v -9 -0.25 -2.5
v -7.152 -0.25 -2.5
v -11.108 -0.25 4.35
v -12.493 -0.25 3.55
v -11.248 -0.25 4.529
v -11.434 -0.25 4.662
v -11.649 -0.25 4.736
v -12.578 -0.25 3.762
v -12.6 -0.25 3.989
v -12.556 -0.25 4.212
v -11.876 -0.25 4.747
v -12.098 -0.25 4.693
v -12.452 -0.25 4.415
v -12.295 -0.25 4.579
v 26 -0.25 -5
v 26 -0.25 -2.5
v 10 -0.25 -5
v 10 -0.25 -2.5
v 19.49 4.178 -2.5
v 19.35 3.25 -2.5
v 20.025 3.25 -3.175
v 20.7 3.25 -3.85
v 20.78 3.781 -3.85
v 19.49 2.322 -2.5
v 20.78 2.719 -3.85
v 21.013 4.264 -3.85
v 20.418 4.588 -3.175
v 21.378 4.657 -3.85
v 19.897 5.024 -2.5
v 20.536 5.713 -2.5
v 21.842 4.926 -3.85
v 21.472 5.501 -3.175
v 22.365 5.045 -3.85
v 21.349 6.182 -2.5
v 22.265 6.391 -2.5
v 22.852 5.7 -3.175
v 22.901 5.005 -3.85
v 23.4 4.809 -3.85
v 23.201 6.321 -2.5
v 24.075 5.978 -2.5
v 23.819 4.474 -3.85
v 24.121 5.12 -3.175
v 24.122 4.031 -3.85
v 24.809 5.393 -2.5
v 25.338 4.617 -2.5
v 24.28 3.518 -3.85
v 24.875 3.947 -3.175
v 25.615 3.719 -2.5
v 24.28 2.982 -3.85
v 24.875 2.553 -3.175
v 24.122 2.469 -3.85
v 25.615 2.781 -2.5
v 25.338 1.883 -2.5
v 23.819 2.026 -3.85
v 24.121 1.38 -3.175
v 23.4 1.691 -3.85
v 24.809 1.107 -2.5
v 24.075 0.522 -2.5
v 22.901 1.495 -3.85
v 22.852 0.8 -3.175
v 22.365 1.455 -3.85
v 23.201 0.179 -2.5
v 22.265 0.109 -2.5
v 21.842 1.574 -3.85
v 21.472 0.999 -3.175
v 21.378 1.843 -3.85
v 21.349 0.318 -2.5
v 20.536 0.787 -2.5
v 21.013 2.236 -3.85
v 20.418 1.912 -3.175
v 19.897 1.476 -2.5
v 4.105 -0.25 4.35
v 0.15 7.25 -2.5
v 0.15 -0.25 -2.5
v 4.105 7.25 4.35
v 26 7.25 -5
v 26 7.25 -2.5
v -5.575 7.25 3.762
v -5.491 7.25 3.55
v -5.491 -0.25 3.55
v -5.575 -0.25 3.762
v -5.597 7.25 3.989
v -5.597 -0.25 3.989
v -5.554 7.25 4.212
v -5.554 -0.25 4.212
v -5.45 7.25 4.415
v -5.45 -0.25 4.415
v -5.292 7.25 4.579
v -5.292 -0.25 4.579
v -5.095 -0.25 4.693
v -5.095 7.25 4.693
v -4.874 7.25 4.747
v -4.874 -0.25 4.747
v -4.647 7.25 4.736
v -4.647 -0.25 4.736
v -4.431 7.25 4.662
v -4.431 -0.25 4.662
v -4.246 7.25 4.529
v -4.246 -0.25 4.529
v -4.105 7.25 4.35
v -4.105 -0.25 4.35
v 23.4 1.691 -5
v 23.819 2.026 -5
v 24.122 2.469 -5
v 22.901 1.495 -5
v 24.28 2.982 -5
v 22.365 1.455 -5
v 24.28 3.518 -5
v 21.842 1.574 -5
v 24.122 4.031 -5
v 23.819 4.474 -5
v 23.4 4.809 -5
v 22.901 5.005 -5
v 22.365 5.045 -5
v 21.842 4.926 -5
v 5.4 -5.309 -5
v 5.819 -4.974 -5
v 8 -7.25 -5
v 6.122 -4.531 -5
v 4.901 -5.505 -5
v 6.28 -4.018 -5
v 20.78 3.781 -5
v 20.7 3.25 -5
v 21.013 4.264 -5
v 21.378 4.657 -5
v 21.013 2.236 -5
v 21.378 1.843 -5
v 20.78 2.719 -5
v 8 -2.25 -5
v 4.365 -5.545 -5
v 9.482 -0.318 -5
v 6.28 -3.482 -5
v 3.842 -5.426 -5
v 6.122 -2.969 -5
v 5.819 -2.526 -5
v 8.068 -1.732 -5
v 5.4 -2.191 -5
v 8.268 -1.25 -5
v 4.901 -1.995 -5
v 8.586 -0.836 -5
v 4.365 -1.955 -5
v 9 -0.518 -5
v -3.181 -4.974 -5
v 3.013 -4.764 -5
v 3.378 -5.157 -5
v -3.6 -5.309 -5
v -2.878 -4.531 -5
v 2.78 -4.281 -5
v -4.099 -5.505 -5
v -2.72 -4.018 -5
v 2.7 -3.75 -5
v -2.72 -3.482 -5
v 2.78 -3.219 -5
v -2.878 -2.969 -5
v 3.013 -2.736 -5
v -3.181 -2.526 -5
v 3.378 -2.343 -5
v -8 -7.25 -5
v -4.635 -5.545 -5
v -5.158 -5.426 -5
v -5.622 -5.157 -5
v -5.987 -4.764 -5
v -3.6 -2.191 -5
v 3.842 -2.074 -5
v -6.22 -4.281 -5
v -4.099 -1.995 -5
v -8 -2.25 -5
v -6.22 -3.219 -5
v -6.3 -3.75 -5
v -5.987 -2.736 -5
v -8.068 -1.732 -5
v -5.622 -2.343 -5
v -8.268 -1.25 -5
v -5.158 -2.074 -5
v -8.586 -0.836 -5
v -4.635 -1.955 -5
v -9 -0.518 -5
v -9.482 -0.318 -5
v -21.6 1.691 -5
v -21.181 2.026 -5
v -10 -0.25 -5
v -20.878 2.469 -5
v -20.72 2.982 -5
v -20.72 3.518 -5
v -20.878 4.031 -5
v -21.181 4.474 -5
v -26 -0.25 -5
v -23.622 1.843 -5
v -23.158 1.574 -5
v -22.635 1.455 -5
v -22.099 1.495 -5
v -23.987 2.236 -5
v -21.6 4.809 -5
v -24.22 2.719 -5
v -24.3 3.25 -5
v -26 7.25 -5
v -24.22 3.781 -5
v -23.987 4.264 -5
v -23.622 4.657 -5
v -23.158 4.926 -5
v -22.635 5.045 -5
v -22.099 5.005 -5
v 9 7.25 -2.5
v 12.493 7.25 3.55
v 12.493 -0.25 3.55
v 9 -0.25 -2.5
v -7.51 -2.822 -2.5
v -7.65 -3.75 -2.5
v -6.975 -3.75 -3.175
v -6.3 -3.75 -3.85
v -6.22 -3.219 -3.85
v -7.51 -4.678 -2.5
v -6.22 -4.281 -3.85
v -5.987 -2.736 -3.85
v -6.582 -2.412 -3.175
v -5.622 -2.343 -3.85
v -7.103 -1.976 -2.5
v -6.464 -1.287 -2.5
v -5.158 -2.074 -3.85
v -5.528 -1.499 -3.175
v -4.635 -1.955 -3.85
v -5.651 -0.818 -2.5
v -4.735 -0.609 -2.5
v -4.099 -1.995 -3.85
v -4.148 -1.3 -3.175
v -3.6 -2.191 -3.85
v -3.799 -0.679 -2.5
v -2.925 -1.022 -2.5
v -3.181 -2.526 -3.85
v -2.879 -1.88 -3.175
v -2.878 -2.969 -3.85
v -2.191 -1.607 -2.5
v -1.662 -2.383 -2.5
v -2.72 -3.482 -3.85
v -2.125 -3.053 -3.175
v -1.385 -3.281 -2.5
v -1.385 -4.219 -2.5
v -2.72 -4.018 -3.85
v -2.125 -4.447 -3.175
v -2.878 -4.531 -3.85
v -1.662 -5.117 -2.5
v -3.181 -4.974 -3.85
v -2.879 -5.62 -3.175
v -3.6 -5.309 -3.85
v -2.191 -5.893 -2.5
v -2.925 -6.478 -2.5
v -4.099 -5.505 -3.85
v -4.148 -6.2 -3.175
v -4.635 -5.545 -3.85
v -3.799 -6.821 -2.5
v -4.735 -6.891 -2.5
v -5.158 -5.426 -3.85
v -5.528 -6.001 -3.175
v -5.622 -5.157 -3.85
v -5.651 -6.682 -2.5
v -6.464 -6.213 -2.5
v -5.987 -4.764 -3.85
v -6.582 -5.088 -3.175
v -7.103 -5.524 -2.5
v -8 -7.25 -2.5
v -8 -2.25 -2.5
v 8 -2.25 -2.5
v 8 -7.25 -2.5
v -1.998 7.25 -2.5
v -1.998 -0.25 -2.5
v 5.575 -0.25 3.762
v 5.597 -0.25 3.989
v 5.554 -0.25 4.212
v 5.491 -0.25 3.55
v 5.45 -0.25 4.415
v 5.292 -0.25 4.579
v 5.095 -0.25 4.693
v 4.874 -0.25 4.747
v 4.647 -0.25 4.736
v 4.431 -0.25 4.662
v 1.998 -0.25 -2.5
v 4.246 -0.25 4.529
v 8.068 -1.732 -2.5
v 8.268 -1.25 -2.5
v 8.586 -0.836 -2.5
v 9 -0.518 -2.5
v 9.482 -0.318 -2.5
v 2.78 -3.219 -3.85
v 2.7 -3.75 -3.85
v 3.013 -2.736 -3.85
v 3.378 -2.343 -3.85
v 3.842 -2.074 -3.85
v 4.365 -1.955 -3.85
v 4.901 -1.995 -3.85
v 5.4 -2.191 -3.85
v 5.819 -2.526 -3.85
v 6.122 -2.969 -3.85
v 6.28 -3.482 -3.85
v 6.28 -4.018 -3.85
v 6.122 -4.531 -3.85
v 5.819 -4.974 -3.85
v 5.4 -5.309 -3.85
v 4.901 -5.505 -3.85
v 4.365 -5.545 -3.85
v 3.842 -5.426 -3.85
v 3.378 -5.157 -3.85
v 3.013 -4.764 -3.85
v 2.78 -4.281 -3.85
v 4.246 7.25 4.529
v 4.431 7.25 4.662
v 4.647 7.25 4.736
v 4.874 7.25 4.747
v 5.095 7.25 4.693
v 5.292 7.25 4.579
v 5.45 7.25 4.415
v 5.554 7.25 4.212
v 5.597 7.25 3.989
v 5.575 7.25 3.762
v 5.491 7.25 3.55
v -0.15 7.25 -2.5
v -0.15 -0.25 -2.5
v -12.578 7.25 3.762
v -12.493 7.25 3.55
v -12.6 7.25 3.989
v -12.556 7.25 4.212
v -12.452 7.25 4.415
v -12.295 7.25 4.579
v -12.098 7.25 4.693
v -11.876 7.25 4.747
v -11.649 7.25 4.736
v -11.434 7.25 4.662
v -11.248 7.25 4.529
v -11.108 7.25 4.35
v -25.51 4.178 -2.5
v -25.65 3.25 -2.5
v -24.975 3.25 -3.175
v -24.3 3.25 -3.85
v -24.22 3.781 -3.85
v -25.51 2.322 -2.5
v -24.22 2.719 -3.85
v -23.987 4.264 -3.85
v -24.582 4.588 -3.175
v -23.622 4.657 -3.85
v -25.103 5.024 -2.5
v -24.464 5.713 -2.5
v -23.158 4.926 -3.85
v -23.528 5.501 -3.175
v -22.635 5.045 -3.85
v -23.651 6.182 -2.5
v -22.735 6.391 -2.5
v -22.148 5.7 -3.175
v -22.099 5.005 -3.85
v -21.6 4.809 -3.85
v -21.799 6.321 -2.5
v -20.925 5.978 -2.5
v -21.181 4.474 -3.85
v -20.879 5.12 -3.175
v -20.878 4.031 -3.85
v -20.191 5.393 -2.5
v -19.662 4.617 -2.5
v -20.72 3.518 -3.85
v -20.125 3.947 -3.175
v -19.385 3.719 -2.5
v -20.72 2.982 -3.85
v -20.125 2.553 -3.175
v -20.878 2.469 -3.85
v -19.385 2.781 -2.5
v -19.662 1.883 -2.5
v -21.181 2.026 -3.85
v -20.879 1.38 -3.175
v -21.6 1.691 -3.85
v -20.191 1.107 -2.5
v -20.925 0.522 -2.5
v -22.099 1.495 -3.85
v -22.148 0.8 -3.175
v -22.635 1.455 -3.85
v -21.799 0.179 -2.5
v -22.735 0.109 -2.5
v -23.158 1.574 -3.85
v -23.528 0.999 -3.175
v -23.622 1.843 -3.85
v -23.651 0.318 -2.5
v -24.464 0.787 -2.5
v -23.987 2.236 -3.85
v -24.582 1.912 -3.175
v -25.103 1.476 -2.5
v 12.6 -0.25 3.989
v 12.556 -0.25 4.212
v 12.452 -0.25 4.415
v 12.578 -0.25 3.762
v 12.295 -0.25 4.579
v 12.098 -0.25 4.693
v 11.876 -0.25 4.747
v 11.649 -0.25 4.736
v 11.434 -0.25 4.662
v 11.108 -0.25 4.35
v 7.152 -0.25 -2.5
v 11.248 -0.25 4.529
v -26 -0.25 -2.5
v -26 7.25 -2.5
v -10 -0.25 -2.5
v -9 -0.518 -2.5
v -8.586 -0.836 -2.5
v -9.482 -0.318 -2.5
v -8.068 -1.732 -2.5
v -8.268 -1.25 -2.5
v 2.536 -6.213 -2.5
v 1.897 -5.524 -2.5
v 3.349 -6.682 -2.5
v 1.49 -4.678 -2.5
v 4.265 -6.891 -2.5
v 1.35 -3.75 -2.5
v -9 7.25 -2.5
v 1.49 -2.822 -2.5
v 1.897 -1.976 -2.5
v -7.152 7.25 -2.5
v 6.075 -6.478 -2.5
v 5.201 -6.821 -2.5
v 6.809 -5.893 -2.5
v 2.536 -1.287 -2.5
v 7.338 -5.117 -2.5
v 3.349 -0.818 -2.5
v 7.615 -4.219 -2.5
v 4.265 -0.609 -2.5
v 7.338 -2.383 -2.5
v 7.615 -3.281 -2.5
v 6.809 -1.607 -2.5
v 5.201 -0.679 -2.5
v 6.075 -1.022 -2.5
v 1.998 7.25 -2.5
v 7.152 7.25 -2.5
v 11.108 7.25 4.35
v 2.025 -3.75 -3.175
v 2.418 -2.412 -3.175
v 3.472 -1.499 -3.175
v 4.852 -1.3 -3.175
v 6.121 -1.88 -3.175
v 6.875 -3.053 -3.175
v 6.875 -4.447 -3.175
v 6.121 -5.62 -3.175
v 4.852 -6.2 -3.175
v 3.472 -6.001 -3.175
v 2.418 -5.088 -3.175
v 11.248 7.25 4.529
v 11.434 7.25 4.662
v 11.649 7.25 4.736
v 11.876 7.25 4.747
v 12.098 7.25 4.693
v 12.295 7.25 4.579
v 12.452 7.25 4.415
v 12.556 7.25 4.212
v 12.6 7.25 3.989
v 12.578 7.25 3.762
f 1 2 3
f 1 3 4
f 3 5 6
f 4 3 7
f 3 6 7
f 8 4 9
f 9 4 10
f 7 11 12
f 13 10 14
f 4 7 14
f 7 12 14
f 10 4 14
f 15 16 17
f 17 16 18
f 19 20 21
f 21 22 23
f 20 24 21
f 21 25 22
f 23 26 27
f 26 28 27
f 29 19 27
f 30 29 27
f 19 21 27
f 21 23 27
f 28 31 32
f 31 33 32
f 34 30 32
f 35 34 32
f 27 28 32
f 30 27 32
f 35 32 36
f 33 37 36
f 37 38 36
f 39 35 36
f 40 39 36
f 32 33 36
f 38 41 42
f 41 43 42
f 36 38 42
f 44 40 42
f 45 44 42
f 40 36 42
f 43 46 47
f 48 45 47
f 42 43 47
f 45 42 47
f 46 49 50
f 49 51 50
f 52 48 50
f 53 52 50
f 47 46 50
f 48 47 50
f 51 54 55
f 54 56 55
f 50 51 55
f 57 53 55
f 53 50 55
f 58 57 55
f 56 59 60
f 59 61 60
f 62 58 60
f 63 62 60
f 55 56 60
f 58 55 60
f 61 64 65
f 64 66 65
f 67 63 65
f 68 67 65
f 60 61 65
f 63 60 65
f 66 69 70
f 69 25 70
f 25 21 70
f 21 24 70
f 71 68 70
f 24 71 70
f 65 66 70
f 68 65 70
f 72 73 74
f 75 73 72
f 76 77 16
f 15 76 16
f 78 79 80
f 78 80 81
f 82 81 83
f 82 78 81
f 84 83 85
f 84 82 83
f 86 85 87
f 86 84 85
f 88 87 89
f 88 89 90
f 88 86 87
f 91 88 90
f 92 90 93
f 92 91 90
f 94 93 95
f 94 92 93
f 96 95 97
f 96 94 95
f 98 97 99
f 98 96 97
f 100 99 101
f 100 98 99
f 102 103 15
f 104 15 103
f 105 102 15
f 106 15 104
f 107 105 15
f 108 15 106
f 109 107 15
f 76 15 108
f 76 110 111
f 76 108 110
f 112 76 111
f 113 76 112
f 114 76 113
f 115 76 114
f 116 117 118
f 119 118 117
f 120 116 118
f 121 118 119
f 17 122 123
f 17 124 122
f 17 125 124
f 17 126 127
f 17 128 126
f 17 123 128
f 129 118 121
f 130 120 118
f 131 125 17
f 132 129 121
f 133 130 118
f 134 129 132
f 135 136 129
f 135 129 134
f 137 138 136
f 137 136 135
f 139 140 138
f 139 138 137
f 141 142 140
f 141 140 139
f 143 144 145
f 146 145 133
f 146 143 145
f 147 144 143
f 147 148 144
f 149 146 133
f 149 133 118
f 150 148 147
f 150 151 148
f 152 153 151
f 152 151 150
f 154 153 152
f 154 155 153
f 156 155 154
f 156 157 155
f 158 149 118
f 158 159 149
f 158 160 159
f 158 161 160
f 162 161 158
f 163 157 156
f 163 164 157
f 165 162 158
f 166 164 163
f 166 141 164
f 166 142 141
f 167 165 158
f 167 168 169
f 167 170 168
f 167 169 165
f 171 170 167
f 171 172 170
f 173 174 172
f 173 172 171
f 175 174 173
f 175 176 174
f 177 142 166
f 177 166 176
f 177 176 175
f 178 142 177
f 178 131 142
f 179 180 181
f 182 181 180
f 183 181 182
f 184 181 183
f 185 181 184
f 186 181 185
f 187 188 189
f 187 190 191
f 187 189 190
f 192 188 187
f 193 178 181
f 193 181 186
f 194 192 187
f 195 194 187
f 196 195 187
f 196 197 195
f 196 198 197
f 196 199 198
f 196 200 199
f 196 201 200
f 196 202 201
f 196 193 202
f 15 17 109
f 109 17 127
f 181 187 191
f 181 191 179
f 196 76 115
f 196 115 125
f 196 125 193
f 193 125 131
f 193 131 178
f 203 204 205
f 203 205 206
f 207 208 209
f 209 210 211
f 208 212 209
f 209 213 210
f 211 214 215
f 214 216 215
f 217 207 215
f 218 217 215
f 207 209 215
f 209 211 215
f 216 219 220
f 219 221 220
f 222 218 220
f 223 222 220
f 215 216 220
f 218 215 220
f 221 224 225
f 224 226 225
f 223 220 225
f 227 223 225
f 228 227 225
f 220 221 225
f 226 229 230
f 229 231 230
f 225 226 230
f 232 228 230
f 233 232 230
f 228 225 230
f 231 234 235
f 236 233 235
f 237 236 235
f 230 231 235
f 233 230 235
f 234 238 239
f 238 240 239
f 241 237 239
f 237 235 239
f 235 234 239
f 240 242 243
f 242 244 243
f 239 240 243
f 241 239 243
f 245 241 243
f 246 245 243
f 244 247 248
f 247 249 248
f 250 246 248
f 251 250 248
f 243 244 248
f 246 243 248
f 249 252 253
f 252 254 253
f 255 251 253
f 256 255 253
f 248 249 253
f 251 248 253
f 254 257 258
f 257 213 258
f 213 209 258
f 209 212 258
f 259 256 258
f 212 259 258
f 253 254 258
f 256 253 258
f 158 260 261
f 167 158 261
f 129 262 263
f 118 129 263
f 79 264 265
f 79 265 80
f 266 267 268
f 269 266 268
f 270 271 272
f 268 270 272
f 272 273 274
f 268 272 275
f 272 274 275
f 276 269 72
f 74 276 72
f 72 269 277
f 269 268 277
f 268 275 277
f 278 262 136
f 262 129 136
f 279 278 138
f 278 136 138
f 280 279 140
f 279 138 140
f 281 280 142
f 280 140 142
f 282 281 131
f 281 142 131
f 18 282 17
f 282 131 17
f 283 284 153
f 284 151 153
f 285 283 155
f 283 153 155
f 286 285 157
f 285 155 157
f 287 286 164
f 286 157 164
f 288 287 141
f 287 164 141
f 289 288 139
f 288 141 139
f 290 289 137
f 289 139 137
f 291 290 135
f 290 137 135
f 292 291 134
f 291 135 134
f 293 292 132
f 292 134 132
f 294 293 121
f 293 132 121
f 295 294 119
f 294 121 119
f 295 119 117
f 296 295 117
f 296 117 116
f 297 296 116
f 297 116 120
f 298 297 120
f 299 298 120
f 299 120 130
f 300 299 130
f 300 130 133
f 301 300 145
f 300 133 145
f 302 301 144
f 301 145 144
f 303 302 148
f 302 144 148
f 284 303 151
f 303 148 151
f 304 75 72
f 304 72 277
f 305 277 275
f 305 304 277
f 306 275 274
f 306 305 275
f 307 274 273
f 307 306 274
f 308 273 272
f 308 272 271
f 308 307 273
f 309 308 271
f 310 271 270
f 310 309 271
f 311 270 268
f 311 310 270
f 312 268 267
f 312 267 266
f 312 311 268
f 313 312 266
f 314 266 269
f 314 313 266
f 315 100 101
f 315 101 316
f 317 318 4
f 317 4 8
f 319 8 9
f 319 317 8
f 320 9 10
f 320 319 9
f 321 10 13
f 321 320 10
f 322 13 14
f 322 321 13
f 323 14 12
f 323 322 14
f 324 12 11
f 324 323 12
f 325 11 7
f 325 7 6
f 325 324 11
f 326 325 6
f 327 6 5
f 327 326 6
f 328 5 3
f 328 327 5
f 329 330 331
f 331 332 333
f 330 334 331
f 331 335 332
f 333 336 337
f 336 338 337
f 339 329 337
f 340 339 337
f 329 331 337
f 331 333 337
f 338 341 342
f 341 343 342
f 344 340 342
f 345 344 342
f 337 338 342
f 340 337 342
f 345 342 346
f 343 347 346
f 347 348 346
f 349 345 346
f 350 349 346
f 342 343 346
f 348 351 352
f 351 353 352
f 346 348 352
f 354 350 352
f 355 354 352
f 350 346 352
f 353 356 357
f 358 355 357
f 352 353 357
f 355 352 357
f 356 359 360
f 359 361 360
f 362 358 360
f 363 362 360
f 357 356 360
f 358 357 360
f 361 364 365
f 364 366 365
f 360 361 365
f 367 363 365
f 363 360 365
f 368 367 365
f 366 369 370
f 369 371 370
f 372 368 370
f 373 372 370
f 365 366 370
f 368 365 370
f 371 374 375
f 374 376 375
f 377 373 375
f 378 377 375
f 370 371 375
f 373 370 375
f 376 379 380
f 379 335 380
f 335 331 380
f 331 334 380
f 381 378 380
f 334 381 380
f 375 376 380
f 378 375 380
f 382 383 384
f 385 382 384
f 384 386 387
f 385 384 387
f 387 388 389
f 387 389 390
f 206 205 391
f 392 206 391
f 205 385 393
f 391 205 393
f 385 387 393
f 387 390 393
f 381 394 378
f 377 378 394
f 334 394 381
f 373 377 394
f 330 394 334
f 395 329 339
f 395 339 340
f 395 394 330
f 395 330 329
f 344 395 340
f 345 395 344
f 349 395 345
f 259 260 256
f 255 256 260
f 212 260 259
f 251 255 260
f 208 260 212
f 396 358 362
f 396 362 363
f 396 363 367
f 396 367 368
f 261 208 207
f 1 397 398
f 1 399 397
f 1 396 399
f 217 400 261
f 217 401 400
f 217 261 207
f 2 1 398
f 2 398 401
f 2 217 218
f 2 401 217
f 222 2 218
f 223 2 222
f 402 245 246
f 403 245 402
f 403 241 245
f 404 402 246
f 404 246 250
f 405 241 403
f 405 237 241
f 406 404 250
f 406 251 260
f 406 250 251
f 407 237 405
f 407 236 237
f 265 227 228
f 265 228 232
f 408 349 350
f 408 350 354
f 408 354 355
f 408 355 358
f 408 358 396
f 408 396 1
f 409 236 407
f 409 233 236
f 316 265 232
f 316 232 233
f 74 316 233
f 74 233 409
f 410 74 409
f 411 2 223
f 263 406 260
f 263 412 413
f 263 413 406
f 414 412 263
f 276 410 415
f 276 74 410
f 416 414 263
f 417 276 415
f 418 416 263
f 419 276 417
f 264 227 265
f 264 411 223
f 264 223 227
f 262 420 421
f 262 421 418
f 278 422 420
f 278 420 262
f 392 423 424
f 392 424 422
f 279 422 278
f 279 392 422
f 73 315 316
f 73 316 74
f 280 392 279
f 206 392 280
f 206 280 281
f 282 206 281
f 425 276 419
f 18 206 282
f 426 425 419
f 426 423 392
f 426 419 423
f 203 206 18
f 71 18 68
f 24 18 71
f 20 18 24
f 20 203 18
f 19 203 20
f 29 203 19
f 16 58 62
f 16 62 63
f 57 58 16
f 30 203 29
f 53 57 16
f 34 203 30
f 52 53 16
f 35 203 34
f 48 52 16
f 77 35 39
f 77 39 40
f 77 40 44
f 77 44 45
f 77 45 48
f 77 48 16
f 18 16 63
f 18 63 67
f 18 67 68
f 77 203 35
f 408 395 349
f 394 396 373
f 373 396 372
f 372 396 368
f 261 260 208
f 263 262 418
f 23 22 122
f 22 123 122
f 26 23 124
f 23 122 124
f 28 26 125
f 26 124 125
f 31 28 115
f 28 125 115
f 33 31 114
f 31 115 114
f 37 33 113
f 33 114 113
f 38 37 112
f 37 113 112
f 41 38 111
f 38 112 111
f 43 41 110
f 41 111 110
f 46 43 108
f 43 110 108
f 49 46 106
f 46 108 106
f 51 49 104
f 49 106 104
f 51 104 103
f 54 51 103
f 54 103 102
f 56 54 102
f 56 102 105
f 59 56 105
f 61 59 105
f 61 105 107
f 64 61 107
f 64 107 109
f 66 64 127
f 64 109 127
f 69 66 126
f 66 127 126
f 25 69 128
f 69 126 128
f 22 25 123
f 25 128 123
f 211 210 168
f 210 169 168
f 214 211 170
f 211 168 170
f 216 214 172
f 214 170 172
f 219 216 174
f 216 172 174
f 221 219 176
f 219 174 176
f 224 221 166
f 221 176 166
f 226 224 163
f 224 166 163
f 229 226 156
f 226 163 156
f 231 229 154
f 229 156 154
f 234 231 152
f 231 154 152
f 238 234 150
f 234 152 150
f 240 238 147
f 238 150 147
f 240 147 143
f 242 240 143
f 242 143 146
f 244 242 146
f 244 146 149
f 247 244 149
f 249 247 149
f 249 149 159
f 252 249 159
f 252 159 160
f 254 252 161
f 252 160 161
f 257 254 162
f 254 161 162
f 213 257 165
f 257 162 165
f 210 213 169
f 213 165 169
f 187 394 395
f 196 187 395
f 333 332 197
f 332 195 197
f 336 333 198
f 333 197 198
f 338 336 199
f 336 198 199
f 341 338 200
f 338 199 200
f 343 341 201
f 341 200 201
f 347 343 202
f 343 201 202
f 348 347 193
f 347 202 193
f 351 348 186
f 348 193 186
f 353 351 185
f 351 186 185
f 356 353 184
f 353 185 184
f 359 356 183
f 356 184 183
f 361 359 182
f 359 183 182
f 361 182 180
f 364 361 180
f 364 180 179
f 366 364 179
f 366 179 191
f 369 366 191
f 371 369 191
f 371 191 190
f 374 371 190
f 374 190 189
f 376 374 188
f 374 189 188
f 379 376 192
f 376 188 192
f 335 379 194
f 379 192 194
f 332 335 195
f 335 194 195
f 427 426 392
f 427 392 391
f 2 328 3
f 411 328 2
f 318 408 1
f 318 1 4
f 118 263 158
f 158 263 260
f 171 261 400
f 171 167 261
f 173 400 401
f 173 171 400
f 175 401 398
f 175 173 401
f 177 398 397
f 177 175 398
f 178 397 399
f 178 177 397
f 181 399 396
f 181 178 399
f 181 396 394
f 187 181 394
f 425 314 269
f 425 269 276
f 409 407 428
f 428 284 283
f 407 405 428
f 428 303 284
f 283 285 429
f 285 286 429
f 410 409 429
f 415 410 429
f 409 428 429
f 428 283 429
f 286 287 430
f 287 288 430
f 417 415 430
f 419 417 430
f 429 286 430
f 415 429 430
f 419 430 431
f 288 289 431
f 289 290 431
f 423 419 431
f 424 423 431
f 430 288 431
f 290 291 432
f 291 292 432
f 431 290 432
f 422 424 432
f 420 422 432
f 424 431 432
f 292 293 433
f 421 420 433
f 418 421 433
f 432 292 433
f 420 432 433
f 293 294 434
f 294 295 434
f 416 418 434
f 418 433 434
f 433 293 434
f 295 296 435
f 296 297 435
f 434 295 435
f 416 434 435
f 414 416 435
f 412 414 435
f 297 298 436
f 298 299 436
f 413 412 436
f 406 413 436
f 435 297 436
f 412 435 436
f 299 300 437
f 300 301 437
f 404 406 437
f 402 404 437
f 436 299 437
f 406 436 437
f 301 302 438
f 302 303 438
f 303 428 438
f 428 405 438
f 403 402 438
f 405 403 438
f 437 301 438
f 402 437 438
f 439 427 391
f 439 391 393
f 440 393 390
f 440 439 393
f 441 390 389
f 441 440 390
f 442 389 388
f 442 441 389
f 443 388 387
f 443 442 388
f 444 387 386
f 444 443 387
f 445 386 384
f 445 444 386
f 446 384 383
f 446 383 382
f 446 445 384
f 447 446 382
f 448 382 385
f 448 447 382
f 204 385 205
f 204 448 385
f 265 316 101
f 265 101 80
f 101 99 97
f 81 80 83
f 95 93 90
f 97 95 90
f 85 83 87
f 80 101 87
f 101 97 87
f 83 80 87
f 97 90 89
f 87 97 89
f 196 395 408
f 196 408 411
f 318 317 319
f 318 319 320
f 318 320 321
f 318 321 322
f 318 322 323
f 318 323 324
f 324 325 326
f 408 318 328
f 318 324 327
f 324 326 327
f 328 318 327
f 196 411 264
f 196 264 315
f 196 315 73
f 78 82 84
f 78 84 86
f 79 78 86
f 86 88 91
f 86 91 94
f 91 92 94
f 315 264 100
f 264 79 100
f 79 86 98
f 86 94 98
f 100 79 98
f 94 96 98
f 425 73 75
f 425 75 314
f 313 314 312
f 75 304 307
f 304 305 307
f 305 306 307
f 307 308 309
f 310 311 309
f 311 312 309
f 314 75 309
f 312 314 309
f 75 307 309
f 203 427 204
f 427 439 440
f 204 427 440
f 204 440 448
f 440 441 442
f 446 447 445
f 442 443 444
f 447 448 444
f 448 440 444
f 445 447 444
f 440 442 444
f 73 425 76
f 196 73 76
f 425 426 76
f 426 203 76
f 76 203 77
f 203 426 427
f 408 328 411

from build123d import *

# Parameters (mm, degrees)
BOSS_EXTRUDE1_DEPTH                                 = 5
SKETCH2_W                                           = 16
SKETCH2_H                                           = 7
SKETCH2_W_2                                         = 7
SKETCH2_H_2                                         = 7.5
CUT_EXTRUDE1_DEPTH                                  = 7.5
CSK_FOR_M3_COUNTERSUNK_FLAT_HEAD_SCREW1_D           = 3.6
CSK_FOR_M3_COUNTERSUNK_FLAT_HEAD_SCREW1_DEPTH       = 5
CSK_FOR_M3_COUNTERSUNK_FLAT_HEAD_SCREW1_CSINK_D     = 6.3
CSK_FOR_M3_COUNTERSUNK_FLAT_HEAD_SCREW1_CSINK_ANGLE = 90
CSK_FOR_M3_COUNTERSUNK_FLAT_HEAD_SCREW1_TIP         = 1.081549114
FILLET1_R                                           = 2
CUT_EXTRUDE2_DEPTH                                  = 7.5


with BuildPart() as part:
    # Sketch1 → Boss-Extrude1 (new, symmetric)
    with BuildSketch(Plane.XY):
        Polygon((26, 7.25), (26, -0.25), (8, -0.25), (8, -7.25), (-8, -7.25), (-8, -0.25), (-26, -0.25), (-26, 7.25), align=None)
    extrude(amount=BOSS_EXTRUDE1_DEPTH, both=True)

    # Sketch2 → Cut-Extrude1 (cut)
    with BuildSketch(Plane.XY.offset(5)):
        with Locations((0, -3.75)):
            Rectangle(SKETCH2_W, SKETCH2_H)
        with Locations((22.5, 3.5)):
            Rectangle(SKETCH2_W_2, SKETCH2_H_2)
        with Locations((-22.5, 3.5)):
            Rectangle(SKETCH2_W_2, SKETCH2_H_2)
    extrude(amount=-CUT_EXTRUDE1_DEPTH, mode=Mode.SUBTRACT)

    # CSK for M3 Countersunk Flat Head Screw1
    with Locations(Plane.XY.offset(-2.5)):
        with Locations((-4.5, -3.75), (4.5, -3.75), (-22.5, 3.25), (22.5, 3.25)):
            CounterSinkHole(CSK_FOR_M3_COUNTERSUNK_FLAT_HEAD_SCREW1_D / 2, CSK_FOR_M3_COUNTERSUNK_FLAT_HEAD_SCREW1_CSINK_D / 2, depth=CSK_FOR_M3_COUNTERSUNK_FLAT_HEAD_SCREW1_DEPTH, counter_sink_angle=CSK_FOR_M3_COUNTERSUNK_FLAT_HEAD_SCREW1_CSINK_ANGLE)
            with Locations((0, 0, -(CSK_FOR_M3_COUNTERSUNK_FLAT_HEAD_SCREW1_DEPTH + CSK_FOR_M3_COUNTERSUNK_FLAT_HEAD_SCREW1_TIP / 2))):  # 118° drill point
                Cone(0, CSK_FOR_M3_COUNTERSUNK_FLAT_HEAD_SCREW1_D / 2, CSK_FOR_M3_COUNTERSUNK_FLAT_HEAD_SCREW1_TIP, mode=Mode.SUBTRACT)

    # Fillet1
    fillet1_edges = [part.edges().sort_by_distance(p)[0] for p in [
        (8, -0.25, -3.75),
        (-8, -0.25, -3.75),
    ]]
    fillet(fillet1_edges, radius=FILLET1_R)

    # Sketch6 → Cut-Extrude2 (cut)
    with BuildSketch(Plane(origin=(0, 7.25, 0), x_dir=(1, 0, 0), z_dir=(0, 1, 0))):
        with BuildLine():
            Line((13.330127019, -5), (11.482606158, -5))
            Line((11.482606158, -5), (4.480127019, -5))
            Line((4.480127019, -5), (-19, -5))
            Line((-19, -5), (-19, 2.5))
            Line((-19, 2.5), (-9, 2.5))
            Line((-9, 2.5), (-12.493246804, -3.550480947))
            ThreePointArc((-12.493246804, -3.550480947), (-12.200426481, -4.64330127), (-11.107606158, -4.350480947))
            Line((-11.107606158, -4.350480947), (-7.152479139, 2.5))
            Line((-7.152479139, 2.5), (-1.997520861, 2.5))
            Line((-1.997520861, 2.5), (-5.490767665, -3.550480947))
            ThreePointArc((-5.490767665, -3.550480947), (-5.197947342, -4.64330127), (-4.105127019, -4.350480947))
            Line((-4.105127019, -4.350480947), (-0.15, 2.5))
            Line((-0.15, 2.5), (0.15, 2.5))
            Line((0.15, 2.5), (4.105127019, -4.350480947))
            ThreePointArc((4.105127019, -4.350480947), (5.197947342, -4.64330127), (5.490767665, -3.550480947))
            Line((5.490767665, -3.550480947), (1.997520861, 2.5))
            Line((1.997520861, 2.5), (7.152479139, 2.5))
            Line((7.152479139, 2.5), (11.107606158, -4.350480947))
            ThreePointArc((11.107606158, -4.350480947), (12.200426481, -4.64330127), (12.493246804, -3.550480947))
            Line((12.493246804, -3.550480947), (9, 2.5))
            Line((9, 2.5), (19, 2.5))
            Line((19, 2.5), (19, -5))
            Line((19, -5), (13.330127019, -5))
        make_face()
    extrude(amount=-CUT_EXTRUDE2_DEPTH, mode=Mode.SUBTRACT)


solid = part.part
